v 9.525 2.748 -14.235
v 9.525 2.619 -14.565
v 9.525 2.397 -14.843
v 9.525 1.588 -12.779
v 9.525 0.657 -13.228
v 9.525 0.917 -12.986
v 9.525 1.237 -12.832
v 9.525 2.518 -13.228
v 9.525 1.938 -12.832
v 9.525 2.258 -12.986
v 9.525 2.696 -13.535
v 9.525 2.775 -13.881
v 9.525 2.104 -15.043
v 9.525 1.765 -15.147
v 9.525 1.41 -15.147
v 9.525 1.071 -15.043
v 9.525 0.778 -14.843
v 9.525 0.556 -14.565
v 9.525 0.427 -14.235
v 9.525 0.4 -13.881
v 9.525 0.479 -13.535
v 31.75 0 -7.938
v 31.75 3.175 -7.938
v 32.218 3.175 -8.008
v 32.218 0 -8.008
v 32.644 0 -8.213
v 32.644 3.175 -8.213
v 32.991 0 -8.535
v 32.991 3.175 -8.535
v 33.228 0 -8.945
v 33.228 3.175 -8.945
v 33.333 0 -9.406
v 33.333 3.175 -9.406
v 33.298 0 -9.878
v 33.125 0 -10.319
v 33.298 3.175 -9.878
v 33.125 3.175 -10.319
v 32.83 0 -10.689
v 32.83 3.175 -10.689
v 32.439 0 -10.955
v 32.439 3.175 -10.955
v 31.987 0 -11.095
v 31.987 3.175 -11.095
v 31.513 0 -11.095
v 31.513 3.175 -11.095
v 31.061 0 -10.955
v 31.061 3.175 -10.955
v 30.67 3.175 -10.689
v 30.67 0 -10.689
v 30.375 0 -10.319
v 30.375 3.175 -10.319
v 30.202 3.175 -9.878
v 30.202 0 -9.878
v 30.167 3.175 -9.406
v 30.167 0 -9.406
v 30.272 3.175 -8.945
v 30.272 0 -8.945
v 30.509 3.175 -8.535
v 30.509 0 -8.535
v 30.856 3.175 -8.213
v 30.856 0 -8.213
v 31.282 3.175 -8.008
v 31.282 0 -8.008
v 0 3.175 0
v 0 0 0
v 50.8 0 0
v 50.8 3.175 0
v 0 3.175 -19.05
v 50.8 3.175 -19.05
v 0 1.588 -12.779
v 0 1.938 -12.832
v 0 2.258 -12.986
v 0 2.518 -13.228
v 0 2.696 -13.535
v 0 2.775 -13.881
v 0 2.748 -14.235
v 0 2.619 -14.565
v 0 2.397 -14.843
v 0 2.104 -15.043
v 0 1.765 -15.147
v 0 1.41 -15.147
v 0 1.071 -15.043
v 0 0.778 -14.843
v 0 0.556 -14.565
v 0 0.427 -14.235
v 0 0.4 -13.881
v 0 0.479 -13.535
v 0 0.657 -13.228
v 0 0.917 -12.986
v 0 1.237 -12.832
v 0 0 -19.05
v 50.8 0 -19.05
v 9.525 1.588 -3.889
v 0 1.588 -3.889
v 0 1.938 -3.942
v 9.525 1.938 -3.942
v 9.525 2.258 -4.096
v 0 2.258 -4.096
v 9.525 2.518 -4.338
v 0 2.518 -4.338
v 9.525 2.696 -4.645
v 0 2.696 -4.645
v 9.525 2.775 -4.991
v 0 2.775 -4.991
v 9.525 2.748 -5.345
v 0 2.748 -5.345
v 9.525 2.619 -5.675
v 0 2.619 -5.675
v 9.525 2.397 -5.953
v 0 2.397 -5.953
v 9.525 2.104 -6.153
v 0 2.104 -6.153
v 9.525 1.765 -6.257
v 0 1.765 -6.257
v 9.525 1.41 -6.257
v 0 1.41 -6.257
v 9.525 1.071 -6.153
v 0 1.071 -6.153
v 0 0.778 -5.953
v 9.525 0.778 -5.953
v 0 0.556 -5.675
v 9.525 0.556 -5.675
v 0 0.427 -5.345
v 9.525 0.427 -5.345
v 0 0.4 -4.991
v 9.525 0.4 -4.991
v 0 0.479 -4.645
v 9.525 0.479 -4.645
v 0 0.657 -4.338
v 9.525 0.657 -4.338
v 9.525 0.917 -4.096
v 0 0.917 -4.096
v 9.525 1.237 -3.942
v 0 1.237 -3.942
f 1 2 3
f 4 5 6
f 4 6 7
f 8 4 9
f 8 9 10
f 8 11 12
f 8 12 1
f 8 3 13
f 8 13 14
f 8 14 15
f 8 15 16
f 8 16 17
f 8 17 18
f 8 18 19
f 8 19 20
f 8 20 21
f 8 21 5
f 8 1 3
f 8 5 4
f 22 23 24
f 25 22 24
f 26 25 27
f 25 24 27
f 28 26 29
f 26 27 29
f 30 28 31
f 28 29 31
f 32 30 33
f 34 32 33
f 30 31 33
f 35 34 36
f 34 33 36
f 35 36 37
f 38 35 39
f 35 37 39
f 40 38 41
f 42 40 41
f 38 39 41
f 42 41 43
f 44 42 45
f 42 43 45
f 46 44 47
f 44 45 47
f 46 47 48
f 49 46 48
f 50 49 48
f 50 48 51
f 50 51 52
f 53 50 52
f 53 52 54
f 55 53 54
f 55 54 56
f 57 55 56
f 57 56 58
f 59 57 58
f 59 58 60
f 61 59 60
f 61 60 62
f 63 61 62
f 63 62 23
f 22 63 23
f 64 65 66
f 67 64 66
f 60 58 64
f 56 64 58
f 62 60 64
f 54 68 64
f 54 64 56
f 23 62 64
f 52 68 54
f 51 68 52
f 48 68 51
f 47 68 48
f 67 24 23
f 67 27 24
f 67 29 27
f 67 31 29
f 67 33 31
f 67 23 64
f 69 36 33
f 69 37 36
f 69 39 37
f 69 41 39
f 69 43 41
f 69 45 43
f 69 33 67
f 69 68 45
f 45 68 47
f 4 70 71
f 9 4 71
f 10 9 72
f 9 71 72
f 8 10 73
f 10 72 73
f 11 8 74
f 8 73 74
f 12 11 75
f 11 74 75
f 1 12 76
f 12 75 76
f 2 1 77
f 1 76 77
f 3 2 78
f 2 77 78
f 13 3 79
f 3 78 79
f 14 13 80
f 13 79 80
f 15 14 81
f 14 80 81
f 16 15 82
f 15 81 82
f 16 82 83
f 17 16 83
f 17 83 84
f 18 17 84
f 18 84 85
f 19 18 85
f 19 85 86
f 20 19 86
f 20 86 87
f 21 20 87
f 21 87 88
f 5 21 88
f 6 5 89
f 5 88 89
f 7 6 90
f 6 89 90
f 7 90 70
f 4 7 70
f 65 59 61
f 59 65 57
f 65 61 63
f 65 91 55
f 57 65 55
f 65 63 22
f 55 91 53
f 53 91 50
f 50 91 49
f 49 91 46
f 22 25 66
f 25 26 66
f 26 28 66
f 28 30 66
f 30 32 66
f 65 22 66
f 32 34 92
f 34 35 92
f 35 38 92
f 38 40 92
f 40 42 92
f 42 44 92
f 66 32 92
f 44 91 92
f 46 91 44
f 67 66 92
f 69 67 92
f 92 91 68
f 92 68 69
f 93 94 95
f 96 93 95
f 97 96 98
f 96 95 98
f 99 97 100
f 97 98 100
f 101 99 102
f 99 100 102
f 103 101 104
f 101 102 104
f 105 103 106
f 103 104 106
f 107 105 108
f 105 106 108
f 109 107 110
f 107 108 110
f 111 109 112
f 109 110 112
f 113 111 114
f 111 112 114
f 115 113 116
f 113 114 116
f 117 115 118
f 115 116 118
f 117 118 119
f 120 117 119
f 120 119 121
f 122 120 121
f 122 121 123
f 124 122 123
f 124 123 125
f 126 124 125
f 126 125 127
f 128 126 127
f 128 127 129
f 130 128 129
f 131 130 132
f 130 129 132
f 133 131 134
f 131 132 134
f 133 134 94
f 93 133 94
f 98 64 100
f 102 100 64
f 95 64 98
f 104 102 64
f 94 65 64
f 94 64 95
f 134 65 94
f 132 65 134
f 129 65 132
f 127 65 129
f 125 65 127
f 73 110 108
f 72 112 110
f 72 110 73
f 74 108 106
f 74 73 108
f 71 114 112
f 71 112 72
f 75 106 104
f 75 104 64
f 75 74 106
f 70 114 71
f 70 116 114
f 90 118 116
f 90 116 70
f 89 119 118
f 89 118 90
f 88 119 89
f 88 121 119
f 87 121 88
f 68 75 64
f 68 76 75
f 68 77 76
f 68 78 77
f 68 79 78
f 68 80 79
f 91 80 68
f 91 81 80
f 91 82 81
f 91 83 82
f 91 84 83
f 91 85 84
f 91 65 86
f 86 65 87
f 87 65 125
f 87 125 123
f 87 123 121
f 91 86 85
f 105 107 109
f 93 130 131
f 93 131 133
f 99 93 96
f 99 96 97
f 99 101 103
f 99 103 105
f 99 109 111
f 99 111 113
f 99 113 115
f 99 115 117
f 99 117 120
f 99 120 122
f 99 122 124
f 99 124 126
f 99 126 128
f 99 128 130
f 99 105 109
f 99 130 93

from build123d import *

# Parameters (mm, degrees)
SKETCH1_W           = 50.8
SKETCH1_H           = 19.05
BOSS_EXTRUDE1_DEPTH = 3.175
SKETCH2_R           = 1.190625
CUT_EXTRUDE1_DEPTH  = 9.525
SKETCH3_R           = 1.5875
CUT_EXTRUDE2_DEPTH  = 55.34724579


with BuildPart() as part:
    # Sketch1 → Boss-Extrude1 (new body)
    with BuildSketch(Plane(origin=(0, 0, 0), x_dir=(1, 0, 0), z_dir=(0, 1, 0))):
        with Locations((25.4, 9.525)):
            Rectangle(SKETCH1_W, SKETCH1_H)
    extrude(amount=BOSS_EXTRUDE1_DEPTH)

    # Sketch2 → Cut-Extrude1 (cut)
    with BuildSketch(Plane.ZY):
        with Locations((-5.08, 1.5875)):
            Circle(SKETCH2_R)
        with Locations((-13.97, 1.5875)):
            Circle(SKETCH2_R)
    extrude(amount=-CUT_EXTRUDE1_DEPTH, mode=Mode.SUBTRACT)

    # Sketch3 → Cut-Extrude2 (cut, through all)
    with BuildSketch(Plane(origin=(0, 3.175, 0), x_dir=(1, 0, 0), z_dir=(0, 1, 0))):
        with Locations(Location((31.75, 9.525, 0), (0, 0, 270))):
            Circle(SKETCH3_R)
    extrude(amount=-CUT_EXTRUDE2_DEPTH, mode=Mode.SUBTRACT)


solid = part.part
